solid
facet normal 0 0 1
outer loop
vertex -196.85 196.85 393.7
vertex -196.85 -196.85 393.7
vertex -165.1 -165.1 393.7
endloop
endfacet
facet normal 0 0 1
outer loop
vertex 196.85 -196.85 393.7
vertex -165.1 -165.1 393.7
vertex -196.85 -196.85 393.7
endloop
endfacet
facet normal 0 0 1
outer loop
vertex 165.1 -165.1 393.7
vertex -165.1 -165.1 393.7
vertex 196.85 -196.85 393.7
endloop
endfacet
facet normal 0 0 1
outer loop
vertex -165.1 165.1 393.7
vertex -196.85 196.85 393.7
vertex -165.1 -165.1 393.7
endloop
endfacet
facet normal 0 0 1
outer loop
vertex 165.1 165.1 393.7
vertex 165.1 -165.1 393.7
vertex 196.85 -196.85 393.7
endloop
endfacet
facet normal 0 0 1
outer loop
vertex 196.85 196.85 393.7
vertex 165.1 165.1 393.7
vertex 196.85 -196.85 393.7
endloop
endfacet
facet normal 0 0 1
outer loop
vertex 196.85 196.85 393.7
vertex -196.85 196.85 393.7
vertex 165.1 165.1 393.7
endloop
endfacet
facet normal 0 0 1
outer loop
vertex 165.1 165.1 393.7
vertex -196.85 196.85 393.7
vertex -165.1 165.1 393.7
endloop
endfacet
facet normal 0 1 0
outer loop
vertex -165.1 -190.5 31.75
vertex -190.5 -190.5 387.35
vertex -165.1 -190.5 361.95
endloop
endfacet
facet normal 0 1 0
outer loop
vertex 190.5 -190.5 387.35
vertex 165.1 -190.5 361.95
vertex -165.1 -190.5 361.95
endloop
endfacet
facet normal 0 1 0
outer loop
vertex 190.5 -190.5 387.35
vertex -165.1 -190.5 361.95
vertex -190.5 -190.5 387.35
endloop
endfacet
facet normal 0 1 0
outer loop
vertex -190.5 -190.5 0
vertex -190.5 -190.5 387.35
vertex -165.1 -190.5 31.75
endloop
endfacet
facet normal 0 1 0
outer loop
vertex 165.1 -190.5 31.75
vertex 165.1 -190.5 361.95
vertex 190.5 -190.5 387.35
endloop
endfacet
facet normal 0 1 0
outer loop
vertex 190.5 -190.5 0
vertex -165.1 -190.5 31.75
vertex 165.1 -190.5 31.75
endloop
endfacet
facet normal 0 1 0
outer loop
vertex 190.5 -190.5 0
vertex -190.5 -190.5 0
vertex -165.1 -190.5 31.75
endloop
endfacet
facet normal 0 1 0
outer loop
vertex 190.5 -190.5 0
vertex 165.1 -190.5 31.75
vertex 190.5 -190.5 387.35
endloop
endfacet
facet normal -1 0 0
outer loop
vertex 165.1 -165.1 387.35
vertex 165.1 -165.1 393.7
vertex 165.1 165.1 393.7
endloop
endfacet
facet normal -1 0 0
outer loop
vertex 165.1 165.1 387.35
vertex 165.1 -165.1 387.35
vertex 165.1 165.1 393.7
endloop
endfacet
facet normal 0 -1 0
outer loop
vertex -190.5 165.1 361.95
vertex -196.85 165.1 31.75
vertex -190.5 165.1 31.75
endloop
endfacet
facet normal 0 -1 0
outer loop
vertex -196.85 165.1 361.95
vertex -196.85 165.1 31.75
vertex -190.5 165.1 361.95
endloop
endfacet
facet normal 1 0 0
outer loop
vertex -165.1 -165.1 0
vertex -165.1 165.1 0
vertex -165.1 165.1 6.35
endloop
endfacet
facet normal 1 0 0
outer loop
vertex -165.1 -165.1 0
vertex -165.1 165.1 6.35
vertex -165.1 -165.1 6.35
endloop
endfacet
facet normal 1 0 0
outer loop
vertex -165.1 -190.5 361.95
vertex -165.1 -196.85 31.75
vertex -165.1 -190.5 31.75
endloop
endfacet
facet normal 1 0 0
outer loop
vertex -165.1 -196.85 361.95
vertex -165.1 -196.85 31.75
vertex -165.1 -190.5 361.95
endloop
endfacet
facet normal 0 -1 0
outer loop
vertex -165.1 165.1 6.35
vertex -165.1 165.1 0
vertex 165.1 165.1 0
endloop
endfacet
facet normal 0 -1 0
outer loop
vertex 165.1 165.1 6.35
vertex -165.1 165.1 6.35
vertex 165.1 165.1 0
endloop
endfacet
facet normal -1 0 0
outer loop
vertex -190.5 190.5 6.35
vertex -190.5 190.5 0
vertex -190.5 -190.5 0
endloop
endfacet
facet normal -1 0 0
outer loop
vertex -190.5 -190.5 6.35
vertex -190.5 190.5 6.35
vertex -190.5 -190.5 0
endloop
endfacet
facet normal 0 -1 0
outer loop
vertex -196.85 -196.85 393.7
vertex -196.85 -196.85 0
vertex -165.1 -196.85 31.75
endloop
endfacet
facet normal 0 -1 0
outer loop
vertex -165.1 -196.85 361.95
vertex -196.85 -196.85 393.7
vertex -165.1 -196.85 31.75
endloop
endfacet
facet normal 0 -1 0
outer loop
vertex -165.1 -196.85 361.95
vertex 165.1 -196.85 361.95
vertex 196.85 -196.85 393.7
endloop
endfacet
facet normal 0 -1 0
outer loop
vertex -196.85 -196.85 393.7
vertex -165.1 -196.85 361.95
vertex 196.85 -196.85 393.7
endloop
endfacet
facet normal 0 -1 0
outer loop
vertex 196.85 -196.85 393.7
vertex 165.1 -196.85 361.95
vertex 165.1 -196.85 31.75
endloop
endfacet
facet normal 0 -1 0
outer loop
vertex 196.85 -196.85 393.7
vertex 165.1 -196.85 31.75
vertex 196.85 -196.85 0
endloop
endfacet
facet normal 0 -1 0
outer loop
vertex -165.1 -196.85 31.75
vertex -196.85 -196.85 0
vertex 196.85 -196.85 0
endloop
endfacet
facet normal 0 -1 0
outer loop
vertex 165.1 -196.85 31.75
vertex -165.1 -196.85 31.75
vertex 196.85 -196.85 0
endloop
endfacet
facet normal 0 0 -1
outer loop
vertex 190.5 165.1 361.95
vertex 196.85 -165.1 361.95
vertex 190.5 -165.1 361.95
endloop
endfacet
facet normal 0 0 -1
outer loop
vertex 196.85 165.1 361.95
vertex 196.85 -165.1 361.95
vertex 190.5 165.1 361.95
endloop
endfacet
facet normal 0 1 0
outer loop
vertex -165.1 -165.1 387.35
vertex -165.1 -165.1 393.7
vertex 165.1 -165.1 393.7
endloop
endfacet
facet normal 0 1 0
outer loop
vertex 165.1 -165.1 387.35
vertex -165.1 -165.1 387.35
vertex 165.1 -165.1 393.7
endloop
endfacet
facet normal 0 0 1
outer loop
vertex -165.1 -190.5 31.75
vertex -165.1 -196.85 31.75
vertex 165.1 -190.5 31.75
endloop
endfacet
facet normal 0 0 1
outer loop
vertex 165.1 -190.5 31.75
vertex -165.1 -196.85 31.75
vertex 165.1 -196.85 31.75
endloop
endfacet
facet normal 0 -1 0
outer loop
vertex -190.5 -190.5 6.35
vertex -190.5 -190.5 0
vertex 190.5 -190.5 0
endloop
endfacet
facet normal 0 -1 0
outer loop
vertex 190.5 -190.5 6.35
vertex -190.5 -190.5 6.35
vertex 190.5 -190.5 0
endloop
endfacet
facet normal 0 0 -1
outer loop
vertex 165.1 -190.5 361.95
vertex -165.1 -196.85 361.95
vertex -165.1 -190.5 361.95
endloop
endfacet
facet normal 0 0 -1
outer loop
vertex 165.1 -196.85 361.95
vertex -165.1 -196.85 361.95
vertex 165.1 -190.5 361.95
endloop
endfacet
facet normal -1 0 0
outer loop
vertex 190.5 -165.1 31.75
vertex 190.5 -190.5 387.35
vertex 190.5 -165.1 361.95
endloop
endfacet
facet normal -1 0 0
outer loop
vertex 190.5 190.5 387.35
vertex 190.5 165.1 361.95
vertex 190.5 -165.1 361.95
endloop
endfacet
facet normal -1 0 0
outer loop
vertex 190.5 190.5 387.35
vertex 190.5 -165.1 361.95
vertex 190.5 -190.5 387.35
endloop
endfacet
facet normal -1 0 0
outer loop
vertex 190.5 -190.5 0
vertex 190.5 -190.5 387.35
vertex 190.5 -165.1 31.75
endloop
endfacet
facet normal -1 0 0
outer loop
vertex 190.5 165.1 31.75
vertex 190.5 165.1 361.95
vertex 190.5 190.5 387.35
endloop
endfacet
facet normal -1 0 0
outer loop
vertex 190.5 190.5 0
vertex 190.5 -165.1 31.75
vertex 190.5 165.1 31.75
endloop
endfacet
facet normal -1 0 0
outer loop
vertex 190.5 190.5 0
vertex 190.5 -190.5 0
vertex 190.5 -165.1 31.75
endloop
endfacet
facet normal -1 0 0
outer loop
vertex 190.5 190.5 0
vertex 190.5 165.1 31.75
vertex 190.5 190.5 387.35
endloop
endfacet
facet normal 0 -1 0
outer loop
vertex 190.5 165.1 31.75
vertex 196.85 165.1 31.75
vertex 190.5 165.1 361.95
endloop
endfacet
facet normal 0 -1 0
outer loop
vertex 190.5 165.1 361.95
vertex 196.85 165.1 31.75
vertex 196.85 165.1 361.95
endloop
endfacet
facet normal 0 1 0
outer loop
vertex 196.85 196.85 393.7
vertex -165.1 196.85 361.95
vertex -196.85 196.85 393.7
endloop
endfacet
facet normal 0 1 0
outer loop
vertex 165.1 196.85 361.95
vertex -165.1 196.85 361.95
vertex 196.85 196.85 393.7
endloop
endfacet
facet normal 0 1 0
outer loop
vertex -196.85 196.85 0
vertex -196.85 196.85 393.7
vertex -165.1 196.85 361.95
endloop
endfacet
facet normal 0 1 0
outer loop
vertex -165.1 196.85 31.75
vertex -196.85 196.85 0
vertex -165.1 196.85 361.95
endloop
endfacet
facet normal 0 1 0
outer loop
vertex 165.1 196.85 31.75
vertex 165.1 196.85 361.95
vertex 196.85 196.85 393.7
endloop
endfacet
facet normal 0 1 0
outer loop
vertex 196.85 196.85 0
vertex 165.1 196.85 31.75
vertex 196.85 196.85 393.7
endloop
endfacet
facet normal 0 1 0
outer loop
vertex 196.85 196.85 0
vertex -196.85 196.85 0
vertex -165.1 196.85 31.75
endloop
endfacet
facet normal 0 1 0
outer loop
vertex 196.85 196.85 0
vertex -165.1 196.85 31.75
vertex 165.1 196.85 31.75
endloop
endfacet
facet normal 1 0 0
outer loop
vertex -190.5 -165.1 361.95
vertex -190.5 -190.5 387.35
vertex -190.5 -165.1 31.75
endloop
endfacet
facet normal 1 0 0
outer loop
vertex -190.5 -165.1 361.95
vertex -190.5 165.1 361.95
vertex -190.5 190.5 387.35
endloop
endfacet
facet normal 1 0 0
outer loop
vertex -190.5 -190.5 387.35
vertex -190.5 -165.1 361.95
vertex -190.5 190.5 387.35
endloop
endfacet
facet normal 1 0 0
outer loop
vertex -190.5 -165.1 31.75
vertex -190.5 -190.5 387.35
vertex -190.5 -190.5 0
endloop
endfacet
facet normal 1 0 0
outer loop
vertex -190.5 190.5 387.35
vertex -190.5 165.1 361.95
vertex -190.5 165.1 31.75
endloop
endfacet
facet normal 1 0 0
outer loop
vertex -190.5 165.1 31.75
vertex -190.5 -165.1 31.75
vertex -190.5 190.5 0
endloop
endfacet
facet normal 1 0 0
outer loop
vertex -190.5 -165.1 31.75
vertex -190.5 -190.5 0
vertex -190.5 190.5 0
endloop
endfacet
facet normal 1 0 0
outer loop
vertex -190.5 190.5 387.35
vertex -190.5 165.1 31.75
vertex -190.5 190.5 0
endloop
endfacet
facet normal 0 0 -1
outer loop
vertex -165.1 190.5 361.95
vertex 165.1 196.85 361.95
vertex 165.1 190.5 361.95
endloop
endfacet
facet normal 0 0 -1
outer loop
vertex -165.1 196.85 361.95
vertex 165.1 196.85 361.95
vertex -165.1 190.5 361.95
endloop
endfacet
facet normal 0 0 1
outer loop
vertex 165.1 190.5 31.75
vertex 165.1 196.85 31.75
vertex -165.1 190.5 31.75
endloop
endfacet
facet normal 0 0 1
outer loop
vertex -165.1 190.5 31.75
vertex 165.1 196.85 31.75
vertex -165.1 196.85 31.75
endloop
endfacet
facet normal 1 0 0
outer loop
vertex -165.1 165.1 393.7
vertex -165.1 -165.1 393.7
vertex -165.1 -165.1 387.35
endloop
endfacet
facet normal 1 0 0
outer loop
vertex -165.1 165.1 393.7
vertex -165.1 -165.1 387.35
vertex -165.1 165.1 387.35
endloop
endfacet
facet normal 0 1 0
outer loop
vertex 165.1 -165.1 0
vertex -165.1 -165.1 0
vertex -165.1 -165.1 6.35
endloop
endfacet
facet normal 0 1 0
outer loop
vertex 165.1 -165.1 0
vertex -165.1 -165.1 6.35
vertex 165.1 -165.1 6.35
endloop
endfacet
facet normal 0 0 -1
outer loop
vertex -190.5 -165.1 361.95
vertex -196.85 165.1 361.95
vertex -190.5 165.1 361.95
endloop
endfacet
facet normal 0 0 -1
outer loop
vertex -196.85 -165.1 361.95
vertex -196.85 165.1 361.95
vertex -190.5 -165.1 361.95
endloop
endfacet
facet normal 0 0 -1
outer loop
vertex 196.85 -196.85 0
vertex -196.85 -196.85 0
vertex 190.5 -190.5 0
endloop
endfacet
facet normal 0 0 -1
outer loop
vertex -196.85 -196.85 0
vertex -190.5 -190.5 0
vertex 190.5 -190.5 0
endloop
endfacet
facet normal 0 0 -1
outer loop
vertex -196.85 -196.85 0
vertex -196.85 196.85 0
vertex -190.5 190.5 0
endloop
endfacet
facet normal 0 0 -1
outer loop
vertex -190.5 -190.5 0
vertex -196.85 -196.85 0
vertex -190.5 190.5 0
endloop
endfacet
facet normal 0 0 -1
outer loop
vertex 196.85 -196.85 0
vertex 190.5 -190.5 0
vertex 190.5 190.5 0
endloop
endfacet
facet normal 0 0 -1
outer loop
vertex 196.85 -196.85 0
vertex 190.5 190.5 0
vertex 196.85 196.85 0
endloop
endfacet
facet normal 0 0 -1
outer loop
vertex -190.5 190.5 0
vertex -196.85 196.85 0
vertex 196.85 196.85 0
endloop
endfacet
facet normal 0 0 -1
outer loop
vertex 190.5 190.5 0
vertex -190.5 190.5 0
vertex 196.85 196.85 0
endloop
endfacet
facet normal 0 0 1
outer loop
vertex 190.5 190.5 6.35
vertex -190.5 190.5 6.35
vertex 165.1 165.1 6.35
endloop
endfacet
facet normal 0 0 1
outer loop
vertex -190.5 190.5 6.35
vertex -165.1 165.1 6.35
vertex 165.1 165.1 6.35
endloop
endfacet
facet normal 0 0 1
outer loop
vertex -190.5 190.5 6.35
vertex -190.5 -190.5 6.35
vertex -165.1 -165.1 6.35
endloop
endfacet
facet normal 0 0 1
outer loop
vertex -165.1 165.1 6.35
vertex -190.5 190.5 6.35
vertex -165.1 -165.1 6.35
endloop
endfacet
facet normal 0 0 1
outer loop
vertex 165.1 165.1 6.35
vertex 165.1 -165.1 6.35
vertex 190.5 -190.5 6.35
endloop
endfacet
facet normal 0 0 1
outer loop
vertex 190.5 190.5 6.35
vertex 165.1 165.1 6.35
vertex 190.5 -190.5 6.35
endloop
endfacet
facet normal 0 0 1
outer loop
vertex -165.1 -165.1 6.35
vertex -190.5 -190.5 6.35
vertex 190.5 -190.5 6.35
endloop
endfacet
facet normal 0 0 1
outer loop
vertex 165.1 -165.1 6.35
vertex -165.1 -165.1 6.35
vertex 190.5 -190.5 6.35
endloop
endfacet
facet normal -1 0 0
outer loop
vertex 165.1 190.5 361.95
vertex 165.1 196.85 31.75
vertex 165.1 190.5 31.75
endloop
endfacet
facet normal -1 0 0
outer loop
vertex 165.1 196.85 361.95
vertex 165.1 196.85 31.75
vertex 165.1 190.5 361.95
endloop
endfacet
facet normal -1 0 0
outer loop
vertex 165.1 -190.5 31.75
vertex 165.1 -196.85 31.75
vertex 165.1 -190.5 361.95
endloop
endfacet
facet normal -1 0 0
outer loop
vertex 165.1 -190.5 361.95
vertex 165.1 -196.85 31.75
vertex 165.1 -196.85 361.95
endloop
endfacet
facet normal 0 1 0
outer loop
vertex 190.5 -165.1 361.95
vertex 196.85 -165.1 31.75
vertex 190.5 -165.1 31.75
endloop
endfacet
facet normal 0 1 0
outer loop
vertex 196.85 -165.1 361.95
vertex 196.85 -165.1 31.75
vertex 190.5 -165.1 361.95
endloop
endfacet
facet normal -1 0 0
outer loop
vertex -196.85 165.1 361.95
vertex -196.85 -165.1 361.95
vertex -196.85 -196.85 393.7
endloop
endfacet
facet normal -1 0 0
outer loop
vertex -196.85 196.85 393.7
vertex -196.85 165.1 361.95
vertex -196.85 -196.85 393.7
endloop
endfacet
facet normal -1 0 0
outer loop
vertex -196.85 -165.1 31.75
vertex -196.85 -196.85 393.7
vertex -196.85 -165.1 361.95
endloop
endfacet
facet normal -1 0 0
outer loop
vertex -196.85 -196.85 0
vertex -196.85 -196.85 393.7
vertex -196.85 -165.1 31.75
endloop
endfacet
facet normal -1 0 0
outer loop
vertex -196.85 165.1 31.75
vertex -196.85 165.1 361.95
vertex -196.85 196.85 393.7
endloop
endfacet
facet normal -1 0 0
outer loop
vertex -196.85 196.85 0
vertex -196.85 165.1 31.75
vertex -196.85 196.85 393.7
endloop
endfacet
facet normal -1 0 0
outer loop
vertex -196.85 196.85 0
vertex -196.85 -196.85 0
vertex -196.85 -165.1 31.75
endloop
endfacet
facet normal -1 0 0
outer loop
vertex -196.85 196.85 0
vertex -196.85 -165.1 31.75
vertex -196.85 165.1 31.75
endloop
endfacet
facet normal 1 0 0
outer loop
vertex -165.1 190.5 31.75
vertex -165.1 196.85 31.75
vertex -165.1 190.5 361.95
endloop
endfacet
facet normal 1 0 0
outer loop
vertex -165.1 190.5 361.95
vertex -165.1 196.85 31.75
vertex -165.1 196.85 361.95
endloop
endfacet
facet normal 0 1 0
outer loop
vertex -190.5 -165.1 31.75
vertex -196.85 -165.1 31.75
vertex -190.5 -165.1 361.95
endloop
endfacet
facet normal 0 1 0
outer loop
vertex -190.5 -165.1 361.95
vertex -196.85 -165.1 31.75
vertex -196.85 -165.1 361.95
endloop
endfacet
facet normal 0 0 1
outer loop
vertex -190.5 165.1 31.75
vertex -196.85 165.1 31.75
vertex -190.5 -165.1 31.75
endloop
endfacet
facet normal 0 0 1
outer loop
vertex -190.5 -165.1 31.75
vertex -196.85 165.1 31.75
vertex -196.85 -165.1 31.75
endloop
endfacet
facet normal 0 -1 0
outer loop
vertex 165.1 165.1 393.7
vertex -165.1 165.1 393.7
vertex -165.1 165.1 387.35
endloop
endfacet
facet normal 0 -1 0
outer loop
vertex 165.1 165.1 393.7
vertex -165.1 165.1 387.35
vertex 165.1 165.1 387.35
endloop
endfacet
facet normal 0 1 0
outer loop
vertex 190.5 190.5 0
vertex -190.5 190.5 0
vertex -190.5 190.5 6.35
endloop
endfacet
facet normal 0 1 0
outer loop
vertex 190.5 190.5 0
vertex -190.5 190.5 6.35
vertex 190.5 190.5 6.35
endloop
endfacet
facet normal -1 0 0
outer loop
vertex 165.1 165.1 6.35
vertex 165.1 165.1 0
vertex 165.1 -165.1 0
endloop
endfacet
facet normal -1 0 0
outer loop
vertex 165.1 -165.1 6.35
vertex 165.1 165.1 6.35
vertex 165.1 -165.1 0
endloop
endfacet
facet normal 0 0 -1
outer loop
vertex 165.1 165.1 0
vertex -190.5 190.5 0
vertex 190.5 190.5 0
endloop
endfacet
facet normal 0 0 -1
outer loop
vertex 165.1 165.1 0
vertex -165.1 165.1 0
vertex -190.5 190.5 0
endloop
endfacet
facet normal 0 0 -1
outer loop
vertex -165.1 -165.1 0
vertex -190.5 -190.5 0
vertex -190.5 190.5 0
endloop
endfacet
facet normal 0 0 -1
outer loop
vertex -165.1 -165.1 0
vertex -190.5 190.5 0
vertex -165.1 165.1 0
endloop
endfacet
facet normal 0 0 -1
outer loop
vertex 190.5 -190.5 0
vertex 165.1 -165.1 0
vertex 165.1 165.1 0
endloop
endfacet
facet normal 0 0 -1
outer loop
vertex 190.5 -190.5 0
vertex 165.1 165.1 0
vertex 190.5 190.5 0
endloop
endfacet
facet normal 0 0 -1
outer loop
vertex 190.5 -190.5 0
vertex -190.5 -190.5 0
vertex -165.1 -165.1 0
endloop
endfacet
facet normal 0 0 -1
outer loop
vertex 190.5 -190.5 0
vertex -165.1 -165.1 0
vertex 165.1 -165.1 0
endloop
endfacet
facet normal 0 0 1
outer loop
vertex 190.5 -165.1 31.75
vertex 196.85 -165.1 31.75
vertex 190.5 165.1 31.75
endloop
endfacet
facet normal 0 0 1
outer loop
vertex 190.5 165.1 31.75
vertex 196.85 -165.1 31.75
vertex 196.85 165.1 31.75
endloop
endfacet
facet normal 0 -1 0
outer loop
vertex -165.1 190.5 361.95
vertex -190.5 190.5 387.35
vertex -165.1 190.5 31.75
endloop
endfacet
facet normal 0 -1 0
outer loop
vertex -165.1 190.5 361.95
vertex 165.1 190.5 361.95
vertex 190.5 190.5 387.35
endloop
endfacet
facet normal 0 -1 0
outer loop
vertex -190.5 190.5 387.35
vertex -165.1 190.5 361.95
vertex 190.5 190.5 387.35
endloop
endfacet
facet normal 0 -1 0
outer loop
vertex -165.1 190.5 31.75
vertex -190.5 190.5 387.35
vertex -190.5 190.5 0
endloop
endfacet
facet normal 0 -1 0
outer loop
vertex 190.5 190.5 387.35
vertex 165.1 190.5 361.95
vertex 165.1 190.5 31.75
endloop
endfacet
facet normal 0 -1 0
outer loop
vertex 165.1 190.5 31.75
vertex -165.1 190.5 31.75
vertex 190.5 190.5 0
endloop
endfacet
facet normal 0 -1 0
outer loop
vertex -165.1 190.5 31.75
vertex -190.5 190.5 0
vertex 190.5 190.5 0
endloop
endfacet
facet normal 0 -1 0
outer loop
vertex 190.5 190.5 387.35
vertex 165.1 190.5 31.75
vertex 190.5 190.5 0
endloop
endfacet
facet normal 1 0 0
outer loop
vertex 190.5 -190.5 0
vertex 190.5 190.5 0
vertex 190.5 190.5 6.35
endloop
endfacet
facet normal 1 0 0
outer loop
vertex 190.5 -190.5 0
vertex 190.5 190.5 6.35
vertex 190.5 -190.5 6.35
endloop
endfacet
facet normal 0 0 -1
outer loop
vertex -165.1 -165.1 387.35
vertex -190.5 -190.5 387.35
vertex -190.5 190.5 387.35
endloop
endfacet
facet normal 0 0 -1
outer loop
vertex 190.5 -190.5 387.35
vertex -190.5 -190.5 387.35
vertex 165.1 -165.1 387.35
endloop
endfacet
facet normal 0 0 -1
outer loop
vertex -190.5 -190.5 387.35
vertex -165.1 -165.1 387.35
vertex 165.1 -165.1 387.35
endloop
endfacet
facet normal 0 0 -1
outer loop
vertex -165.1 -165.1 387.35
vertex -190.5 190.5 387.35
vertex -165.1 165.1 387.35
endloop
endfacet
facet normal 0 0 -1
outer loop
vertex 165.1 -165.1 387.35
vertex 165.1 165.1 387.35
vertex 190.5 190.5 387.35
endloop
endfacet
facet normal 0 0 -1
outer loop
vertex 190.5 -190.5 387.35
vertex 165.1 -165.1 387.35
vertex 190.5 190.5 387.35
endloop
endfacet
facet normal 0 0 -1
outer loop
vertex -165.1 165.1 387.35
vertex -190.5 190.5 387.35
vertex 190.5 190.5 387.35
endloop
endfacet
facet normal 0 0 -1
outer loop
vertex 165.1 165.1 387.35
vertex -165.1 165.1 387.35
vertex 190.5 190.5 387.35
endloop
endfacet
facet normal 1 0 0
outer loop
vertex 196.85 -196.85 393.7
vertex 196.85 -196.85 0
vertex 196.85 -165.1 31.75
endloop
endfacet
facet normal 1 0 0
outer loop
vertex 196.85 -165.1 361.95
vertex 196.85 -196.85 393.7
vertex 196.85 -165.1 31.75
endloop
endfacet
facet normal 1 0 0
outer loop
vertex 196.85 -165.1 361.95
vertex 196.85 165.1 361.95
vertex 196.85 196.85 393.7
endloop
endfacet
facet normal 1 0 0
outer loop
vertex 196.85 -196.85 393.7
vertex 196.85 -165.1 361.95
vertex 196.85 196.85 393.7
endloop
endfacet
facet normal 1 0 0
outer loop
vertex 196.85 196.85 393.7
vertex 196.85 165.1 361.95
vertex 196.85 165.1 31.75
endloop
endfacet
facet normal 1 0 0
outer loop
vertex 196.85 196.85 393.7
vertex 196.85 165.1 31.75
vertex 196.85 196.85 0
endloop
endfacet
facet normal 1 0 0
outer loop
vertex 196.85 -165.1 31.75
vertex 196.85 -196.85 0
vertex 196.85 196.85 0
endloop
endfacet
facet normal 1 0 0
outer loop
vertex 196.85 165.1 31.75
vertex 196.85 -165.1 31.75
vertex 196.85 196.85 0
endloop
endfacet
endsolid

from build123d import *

# Parameters (mm, degrees)
F0_W      = 393.7
F0_H      = 393.7
F0_W_2    = 381
F0_H_2    = 381
F1_DEPTH  = 393.7
F2_W      = 330.2
F2_H      = 330.2
F3_DEPTH  = 6.35
F4_W      = 330.2
F4_H      = 330.2
F5_DEPTH  = 6.35
F6_W      = 330.2
F6_H      = 330.2
F7_DEPTH  = 6.35
F8_W      = 330.2
F8_H      = 330.2
F9_DEPTH  = 6.35
F10_W     = 381
F10_H     = 381
F11_DEPTH = 6.35
F12_W     = 387.35
F12_H     = 387.35
F13_DEPTH = 6.35
F14_W     = 330.2
F14_H     = 330.2
F15_DEPTH = 6.35
F16_W     = 330.2
F16_H     = 330.2
F17_DEPTH = 6.35


with BuildPart() as f1:
    # F0 (on Top) → F1 (new body)
    with BuildSketch(Plane.XY):
        Rectangle(F0_W, F0_H)
        Rectangle(F0_W_2, F0_H_2, mode=Mode.SUBTRACT)
    extrude(amount=F1_DEPTH)

    # F2 (on face) → F3 (cut)
    with BuildSketch(Plane(origin=(-196.85, 0, 0), x_dir=(0, -1, 0), z_dir=(-1, 0, 0))):
        with Locations((0, 196.85)):
            Rectangle(F2_W, F2_H)
    extrude(amount=-F3_DEPTH, mode=Mode.SUBTRACT)

    # F4 (on face) → F5 (cut)
    with BuildSketch(Plane(origin=(0, 196.85, 0), x_dir=(-1, 0, 0), z_dir=(0, 1, 0))):
        with Locations((0, 196.85)):
            Rectangle(F4_W, F4_H)
    extrude(amount=-F5_DEPTH, mode=Mode.SUBTRACT)

    # F6 (on face) → F7 (cut)
    with BuildSketch(Plane.YZ.offset(196.85)):
        with Locations((0, 196.85)):
            Rectangle(F6_W, F6_H)
    extrude(amount=-F7_DEPTH, mode=Mode.SUBTRACT)

    # F8 (on face) → F9 (cut)
    with BuildSketch(Plane.XZ.offset(196.85)):
        with Locations((0, 196.85)):
            Rectangle(F8_W, F8_H)
    extrude(amount=-F9_DEPTH, mode=Mode.SUBTRACT)

    # F12 (on face) → F13 (join)
    with BuildSketch(Plane.XY.offset(393.7)):
        with Locations((-3.175, 3.175)):
            Rectangle(F12_W, F12_H)
    extrude(amount=-F13_DEPTH)

    # F14 (on face) → F15 (cut)
    with BuildSketch(Plane.XY.offset(393.7)):
        Rectangle(F14_W, F14_H)
    extrude(amount=-F15_DEPTH, mode=Mode.SUBTRACT)


with BuildPart() as f11:
    # F10 (on face) → F11 (new body)
    with BuildSketch(Plane(origin=(0, 0, 0), x_dir=(1, 0, 0), z_dir=(0, 0, -1))):
        Rectangle(F10_W, F10_H)
    extrude(amount=-F11_DEPTH)

    # F16 (on face) → F17 (cut)
    with BuildSketch(Plane(origin=(0, 0, 0), x_dir=(1, 0, 0), z_dir=(0, 0, -1))):
        Rectangle(F16_W, F16_H)
    extrude(amount=-F17_DEPTH, mode=Mode.SUBTRACT)


solid = Compound([f1.part, f11.part])
